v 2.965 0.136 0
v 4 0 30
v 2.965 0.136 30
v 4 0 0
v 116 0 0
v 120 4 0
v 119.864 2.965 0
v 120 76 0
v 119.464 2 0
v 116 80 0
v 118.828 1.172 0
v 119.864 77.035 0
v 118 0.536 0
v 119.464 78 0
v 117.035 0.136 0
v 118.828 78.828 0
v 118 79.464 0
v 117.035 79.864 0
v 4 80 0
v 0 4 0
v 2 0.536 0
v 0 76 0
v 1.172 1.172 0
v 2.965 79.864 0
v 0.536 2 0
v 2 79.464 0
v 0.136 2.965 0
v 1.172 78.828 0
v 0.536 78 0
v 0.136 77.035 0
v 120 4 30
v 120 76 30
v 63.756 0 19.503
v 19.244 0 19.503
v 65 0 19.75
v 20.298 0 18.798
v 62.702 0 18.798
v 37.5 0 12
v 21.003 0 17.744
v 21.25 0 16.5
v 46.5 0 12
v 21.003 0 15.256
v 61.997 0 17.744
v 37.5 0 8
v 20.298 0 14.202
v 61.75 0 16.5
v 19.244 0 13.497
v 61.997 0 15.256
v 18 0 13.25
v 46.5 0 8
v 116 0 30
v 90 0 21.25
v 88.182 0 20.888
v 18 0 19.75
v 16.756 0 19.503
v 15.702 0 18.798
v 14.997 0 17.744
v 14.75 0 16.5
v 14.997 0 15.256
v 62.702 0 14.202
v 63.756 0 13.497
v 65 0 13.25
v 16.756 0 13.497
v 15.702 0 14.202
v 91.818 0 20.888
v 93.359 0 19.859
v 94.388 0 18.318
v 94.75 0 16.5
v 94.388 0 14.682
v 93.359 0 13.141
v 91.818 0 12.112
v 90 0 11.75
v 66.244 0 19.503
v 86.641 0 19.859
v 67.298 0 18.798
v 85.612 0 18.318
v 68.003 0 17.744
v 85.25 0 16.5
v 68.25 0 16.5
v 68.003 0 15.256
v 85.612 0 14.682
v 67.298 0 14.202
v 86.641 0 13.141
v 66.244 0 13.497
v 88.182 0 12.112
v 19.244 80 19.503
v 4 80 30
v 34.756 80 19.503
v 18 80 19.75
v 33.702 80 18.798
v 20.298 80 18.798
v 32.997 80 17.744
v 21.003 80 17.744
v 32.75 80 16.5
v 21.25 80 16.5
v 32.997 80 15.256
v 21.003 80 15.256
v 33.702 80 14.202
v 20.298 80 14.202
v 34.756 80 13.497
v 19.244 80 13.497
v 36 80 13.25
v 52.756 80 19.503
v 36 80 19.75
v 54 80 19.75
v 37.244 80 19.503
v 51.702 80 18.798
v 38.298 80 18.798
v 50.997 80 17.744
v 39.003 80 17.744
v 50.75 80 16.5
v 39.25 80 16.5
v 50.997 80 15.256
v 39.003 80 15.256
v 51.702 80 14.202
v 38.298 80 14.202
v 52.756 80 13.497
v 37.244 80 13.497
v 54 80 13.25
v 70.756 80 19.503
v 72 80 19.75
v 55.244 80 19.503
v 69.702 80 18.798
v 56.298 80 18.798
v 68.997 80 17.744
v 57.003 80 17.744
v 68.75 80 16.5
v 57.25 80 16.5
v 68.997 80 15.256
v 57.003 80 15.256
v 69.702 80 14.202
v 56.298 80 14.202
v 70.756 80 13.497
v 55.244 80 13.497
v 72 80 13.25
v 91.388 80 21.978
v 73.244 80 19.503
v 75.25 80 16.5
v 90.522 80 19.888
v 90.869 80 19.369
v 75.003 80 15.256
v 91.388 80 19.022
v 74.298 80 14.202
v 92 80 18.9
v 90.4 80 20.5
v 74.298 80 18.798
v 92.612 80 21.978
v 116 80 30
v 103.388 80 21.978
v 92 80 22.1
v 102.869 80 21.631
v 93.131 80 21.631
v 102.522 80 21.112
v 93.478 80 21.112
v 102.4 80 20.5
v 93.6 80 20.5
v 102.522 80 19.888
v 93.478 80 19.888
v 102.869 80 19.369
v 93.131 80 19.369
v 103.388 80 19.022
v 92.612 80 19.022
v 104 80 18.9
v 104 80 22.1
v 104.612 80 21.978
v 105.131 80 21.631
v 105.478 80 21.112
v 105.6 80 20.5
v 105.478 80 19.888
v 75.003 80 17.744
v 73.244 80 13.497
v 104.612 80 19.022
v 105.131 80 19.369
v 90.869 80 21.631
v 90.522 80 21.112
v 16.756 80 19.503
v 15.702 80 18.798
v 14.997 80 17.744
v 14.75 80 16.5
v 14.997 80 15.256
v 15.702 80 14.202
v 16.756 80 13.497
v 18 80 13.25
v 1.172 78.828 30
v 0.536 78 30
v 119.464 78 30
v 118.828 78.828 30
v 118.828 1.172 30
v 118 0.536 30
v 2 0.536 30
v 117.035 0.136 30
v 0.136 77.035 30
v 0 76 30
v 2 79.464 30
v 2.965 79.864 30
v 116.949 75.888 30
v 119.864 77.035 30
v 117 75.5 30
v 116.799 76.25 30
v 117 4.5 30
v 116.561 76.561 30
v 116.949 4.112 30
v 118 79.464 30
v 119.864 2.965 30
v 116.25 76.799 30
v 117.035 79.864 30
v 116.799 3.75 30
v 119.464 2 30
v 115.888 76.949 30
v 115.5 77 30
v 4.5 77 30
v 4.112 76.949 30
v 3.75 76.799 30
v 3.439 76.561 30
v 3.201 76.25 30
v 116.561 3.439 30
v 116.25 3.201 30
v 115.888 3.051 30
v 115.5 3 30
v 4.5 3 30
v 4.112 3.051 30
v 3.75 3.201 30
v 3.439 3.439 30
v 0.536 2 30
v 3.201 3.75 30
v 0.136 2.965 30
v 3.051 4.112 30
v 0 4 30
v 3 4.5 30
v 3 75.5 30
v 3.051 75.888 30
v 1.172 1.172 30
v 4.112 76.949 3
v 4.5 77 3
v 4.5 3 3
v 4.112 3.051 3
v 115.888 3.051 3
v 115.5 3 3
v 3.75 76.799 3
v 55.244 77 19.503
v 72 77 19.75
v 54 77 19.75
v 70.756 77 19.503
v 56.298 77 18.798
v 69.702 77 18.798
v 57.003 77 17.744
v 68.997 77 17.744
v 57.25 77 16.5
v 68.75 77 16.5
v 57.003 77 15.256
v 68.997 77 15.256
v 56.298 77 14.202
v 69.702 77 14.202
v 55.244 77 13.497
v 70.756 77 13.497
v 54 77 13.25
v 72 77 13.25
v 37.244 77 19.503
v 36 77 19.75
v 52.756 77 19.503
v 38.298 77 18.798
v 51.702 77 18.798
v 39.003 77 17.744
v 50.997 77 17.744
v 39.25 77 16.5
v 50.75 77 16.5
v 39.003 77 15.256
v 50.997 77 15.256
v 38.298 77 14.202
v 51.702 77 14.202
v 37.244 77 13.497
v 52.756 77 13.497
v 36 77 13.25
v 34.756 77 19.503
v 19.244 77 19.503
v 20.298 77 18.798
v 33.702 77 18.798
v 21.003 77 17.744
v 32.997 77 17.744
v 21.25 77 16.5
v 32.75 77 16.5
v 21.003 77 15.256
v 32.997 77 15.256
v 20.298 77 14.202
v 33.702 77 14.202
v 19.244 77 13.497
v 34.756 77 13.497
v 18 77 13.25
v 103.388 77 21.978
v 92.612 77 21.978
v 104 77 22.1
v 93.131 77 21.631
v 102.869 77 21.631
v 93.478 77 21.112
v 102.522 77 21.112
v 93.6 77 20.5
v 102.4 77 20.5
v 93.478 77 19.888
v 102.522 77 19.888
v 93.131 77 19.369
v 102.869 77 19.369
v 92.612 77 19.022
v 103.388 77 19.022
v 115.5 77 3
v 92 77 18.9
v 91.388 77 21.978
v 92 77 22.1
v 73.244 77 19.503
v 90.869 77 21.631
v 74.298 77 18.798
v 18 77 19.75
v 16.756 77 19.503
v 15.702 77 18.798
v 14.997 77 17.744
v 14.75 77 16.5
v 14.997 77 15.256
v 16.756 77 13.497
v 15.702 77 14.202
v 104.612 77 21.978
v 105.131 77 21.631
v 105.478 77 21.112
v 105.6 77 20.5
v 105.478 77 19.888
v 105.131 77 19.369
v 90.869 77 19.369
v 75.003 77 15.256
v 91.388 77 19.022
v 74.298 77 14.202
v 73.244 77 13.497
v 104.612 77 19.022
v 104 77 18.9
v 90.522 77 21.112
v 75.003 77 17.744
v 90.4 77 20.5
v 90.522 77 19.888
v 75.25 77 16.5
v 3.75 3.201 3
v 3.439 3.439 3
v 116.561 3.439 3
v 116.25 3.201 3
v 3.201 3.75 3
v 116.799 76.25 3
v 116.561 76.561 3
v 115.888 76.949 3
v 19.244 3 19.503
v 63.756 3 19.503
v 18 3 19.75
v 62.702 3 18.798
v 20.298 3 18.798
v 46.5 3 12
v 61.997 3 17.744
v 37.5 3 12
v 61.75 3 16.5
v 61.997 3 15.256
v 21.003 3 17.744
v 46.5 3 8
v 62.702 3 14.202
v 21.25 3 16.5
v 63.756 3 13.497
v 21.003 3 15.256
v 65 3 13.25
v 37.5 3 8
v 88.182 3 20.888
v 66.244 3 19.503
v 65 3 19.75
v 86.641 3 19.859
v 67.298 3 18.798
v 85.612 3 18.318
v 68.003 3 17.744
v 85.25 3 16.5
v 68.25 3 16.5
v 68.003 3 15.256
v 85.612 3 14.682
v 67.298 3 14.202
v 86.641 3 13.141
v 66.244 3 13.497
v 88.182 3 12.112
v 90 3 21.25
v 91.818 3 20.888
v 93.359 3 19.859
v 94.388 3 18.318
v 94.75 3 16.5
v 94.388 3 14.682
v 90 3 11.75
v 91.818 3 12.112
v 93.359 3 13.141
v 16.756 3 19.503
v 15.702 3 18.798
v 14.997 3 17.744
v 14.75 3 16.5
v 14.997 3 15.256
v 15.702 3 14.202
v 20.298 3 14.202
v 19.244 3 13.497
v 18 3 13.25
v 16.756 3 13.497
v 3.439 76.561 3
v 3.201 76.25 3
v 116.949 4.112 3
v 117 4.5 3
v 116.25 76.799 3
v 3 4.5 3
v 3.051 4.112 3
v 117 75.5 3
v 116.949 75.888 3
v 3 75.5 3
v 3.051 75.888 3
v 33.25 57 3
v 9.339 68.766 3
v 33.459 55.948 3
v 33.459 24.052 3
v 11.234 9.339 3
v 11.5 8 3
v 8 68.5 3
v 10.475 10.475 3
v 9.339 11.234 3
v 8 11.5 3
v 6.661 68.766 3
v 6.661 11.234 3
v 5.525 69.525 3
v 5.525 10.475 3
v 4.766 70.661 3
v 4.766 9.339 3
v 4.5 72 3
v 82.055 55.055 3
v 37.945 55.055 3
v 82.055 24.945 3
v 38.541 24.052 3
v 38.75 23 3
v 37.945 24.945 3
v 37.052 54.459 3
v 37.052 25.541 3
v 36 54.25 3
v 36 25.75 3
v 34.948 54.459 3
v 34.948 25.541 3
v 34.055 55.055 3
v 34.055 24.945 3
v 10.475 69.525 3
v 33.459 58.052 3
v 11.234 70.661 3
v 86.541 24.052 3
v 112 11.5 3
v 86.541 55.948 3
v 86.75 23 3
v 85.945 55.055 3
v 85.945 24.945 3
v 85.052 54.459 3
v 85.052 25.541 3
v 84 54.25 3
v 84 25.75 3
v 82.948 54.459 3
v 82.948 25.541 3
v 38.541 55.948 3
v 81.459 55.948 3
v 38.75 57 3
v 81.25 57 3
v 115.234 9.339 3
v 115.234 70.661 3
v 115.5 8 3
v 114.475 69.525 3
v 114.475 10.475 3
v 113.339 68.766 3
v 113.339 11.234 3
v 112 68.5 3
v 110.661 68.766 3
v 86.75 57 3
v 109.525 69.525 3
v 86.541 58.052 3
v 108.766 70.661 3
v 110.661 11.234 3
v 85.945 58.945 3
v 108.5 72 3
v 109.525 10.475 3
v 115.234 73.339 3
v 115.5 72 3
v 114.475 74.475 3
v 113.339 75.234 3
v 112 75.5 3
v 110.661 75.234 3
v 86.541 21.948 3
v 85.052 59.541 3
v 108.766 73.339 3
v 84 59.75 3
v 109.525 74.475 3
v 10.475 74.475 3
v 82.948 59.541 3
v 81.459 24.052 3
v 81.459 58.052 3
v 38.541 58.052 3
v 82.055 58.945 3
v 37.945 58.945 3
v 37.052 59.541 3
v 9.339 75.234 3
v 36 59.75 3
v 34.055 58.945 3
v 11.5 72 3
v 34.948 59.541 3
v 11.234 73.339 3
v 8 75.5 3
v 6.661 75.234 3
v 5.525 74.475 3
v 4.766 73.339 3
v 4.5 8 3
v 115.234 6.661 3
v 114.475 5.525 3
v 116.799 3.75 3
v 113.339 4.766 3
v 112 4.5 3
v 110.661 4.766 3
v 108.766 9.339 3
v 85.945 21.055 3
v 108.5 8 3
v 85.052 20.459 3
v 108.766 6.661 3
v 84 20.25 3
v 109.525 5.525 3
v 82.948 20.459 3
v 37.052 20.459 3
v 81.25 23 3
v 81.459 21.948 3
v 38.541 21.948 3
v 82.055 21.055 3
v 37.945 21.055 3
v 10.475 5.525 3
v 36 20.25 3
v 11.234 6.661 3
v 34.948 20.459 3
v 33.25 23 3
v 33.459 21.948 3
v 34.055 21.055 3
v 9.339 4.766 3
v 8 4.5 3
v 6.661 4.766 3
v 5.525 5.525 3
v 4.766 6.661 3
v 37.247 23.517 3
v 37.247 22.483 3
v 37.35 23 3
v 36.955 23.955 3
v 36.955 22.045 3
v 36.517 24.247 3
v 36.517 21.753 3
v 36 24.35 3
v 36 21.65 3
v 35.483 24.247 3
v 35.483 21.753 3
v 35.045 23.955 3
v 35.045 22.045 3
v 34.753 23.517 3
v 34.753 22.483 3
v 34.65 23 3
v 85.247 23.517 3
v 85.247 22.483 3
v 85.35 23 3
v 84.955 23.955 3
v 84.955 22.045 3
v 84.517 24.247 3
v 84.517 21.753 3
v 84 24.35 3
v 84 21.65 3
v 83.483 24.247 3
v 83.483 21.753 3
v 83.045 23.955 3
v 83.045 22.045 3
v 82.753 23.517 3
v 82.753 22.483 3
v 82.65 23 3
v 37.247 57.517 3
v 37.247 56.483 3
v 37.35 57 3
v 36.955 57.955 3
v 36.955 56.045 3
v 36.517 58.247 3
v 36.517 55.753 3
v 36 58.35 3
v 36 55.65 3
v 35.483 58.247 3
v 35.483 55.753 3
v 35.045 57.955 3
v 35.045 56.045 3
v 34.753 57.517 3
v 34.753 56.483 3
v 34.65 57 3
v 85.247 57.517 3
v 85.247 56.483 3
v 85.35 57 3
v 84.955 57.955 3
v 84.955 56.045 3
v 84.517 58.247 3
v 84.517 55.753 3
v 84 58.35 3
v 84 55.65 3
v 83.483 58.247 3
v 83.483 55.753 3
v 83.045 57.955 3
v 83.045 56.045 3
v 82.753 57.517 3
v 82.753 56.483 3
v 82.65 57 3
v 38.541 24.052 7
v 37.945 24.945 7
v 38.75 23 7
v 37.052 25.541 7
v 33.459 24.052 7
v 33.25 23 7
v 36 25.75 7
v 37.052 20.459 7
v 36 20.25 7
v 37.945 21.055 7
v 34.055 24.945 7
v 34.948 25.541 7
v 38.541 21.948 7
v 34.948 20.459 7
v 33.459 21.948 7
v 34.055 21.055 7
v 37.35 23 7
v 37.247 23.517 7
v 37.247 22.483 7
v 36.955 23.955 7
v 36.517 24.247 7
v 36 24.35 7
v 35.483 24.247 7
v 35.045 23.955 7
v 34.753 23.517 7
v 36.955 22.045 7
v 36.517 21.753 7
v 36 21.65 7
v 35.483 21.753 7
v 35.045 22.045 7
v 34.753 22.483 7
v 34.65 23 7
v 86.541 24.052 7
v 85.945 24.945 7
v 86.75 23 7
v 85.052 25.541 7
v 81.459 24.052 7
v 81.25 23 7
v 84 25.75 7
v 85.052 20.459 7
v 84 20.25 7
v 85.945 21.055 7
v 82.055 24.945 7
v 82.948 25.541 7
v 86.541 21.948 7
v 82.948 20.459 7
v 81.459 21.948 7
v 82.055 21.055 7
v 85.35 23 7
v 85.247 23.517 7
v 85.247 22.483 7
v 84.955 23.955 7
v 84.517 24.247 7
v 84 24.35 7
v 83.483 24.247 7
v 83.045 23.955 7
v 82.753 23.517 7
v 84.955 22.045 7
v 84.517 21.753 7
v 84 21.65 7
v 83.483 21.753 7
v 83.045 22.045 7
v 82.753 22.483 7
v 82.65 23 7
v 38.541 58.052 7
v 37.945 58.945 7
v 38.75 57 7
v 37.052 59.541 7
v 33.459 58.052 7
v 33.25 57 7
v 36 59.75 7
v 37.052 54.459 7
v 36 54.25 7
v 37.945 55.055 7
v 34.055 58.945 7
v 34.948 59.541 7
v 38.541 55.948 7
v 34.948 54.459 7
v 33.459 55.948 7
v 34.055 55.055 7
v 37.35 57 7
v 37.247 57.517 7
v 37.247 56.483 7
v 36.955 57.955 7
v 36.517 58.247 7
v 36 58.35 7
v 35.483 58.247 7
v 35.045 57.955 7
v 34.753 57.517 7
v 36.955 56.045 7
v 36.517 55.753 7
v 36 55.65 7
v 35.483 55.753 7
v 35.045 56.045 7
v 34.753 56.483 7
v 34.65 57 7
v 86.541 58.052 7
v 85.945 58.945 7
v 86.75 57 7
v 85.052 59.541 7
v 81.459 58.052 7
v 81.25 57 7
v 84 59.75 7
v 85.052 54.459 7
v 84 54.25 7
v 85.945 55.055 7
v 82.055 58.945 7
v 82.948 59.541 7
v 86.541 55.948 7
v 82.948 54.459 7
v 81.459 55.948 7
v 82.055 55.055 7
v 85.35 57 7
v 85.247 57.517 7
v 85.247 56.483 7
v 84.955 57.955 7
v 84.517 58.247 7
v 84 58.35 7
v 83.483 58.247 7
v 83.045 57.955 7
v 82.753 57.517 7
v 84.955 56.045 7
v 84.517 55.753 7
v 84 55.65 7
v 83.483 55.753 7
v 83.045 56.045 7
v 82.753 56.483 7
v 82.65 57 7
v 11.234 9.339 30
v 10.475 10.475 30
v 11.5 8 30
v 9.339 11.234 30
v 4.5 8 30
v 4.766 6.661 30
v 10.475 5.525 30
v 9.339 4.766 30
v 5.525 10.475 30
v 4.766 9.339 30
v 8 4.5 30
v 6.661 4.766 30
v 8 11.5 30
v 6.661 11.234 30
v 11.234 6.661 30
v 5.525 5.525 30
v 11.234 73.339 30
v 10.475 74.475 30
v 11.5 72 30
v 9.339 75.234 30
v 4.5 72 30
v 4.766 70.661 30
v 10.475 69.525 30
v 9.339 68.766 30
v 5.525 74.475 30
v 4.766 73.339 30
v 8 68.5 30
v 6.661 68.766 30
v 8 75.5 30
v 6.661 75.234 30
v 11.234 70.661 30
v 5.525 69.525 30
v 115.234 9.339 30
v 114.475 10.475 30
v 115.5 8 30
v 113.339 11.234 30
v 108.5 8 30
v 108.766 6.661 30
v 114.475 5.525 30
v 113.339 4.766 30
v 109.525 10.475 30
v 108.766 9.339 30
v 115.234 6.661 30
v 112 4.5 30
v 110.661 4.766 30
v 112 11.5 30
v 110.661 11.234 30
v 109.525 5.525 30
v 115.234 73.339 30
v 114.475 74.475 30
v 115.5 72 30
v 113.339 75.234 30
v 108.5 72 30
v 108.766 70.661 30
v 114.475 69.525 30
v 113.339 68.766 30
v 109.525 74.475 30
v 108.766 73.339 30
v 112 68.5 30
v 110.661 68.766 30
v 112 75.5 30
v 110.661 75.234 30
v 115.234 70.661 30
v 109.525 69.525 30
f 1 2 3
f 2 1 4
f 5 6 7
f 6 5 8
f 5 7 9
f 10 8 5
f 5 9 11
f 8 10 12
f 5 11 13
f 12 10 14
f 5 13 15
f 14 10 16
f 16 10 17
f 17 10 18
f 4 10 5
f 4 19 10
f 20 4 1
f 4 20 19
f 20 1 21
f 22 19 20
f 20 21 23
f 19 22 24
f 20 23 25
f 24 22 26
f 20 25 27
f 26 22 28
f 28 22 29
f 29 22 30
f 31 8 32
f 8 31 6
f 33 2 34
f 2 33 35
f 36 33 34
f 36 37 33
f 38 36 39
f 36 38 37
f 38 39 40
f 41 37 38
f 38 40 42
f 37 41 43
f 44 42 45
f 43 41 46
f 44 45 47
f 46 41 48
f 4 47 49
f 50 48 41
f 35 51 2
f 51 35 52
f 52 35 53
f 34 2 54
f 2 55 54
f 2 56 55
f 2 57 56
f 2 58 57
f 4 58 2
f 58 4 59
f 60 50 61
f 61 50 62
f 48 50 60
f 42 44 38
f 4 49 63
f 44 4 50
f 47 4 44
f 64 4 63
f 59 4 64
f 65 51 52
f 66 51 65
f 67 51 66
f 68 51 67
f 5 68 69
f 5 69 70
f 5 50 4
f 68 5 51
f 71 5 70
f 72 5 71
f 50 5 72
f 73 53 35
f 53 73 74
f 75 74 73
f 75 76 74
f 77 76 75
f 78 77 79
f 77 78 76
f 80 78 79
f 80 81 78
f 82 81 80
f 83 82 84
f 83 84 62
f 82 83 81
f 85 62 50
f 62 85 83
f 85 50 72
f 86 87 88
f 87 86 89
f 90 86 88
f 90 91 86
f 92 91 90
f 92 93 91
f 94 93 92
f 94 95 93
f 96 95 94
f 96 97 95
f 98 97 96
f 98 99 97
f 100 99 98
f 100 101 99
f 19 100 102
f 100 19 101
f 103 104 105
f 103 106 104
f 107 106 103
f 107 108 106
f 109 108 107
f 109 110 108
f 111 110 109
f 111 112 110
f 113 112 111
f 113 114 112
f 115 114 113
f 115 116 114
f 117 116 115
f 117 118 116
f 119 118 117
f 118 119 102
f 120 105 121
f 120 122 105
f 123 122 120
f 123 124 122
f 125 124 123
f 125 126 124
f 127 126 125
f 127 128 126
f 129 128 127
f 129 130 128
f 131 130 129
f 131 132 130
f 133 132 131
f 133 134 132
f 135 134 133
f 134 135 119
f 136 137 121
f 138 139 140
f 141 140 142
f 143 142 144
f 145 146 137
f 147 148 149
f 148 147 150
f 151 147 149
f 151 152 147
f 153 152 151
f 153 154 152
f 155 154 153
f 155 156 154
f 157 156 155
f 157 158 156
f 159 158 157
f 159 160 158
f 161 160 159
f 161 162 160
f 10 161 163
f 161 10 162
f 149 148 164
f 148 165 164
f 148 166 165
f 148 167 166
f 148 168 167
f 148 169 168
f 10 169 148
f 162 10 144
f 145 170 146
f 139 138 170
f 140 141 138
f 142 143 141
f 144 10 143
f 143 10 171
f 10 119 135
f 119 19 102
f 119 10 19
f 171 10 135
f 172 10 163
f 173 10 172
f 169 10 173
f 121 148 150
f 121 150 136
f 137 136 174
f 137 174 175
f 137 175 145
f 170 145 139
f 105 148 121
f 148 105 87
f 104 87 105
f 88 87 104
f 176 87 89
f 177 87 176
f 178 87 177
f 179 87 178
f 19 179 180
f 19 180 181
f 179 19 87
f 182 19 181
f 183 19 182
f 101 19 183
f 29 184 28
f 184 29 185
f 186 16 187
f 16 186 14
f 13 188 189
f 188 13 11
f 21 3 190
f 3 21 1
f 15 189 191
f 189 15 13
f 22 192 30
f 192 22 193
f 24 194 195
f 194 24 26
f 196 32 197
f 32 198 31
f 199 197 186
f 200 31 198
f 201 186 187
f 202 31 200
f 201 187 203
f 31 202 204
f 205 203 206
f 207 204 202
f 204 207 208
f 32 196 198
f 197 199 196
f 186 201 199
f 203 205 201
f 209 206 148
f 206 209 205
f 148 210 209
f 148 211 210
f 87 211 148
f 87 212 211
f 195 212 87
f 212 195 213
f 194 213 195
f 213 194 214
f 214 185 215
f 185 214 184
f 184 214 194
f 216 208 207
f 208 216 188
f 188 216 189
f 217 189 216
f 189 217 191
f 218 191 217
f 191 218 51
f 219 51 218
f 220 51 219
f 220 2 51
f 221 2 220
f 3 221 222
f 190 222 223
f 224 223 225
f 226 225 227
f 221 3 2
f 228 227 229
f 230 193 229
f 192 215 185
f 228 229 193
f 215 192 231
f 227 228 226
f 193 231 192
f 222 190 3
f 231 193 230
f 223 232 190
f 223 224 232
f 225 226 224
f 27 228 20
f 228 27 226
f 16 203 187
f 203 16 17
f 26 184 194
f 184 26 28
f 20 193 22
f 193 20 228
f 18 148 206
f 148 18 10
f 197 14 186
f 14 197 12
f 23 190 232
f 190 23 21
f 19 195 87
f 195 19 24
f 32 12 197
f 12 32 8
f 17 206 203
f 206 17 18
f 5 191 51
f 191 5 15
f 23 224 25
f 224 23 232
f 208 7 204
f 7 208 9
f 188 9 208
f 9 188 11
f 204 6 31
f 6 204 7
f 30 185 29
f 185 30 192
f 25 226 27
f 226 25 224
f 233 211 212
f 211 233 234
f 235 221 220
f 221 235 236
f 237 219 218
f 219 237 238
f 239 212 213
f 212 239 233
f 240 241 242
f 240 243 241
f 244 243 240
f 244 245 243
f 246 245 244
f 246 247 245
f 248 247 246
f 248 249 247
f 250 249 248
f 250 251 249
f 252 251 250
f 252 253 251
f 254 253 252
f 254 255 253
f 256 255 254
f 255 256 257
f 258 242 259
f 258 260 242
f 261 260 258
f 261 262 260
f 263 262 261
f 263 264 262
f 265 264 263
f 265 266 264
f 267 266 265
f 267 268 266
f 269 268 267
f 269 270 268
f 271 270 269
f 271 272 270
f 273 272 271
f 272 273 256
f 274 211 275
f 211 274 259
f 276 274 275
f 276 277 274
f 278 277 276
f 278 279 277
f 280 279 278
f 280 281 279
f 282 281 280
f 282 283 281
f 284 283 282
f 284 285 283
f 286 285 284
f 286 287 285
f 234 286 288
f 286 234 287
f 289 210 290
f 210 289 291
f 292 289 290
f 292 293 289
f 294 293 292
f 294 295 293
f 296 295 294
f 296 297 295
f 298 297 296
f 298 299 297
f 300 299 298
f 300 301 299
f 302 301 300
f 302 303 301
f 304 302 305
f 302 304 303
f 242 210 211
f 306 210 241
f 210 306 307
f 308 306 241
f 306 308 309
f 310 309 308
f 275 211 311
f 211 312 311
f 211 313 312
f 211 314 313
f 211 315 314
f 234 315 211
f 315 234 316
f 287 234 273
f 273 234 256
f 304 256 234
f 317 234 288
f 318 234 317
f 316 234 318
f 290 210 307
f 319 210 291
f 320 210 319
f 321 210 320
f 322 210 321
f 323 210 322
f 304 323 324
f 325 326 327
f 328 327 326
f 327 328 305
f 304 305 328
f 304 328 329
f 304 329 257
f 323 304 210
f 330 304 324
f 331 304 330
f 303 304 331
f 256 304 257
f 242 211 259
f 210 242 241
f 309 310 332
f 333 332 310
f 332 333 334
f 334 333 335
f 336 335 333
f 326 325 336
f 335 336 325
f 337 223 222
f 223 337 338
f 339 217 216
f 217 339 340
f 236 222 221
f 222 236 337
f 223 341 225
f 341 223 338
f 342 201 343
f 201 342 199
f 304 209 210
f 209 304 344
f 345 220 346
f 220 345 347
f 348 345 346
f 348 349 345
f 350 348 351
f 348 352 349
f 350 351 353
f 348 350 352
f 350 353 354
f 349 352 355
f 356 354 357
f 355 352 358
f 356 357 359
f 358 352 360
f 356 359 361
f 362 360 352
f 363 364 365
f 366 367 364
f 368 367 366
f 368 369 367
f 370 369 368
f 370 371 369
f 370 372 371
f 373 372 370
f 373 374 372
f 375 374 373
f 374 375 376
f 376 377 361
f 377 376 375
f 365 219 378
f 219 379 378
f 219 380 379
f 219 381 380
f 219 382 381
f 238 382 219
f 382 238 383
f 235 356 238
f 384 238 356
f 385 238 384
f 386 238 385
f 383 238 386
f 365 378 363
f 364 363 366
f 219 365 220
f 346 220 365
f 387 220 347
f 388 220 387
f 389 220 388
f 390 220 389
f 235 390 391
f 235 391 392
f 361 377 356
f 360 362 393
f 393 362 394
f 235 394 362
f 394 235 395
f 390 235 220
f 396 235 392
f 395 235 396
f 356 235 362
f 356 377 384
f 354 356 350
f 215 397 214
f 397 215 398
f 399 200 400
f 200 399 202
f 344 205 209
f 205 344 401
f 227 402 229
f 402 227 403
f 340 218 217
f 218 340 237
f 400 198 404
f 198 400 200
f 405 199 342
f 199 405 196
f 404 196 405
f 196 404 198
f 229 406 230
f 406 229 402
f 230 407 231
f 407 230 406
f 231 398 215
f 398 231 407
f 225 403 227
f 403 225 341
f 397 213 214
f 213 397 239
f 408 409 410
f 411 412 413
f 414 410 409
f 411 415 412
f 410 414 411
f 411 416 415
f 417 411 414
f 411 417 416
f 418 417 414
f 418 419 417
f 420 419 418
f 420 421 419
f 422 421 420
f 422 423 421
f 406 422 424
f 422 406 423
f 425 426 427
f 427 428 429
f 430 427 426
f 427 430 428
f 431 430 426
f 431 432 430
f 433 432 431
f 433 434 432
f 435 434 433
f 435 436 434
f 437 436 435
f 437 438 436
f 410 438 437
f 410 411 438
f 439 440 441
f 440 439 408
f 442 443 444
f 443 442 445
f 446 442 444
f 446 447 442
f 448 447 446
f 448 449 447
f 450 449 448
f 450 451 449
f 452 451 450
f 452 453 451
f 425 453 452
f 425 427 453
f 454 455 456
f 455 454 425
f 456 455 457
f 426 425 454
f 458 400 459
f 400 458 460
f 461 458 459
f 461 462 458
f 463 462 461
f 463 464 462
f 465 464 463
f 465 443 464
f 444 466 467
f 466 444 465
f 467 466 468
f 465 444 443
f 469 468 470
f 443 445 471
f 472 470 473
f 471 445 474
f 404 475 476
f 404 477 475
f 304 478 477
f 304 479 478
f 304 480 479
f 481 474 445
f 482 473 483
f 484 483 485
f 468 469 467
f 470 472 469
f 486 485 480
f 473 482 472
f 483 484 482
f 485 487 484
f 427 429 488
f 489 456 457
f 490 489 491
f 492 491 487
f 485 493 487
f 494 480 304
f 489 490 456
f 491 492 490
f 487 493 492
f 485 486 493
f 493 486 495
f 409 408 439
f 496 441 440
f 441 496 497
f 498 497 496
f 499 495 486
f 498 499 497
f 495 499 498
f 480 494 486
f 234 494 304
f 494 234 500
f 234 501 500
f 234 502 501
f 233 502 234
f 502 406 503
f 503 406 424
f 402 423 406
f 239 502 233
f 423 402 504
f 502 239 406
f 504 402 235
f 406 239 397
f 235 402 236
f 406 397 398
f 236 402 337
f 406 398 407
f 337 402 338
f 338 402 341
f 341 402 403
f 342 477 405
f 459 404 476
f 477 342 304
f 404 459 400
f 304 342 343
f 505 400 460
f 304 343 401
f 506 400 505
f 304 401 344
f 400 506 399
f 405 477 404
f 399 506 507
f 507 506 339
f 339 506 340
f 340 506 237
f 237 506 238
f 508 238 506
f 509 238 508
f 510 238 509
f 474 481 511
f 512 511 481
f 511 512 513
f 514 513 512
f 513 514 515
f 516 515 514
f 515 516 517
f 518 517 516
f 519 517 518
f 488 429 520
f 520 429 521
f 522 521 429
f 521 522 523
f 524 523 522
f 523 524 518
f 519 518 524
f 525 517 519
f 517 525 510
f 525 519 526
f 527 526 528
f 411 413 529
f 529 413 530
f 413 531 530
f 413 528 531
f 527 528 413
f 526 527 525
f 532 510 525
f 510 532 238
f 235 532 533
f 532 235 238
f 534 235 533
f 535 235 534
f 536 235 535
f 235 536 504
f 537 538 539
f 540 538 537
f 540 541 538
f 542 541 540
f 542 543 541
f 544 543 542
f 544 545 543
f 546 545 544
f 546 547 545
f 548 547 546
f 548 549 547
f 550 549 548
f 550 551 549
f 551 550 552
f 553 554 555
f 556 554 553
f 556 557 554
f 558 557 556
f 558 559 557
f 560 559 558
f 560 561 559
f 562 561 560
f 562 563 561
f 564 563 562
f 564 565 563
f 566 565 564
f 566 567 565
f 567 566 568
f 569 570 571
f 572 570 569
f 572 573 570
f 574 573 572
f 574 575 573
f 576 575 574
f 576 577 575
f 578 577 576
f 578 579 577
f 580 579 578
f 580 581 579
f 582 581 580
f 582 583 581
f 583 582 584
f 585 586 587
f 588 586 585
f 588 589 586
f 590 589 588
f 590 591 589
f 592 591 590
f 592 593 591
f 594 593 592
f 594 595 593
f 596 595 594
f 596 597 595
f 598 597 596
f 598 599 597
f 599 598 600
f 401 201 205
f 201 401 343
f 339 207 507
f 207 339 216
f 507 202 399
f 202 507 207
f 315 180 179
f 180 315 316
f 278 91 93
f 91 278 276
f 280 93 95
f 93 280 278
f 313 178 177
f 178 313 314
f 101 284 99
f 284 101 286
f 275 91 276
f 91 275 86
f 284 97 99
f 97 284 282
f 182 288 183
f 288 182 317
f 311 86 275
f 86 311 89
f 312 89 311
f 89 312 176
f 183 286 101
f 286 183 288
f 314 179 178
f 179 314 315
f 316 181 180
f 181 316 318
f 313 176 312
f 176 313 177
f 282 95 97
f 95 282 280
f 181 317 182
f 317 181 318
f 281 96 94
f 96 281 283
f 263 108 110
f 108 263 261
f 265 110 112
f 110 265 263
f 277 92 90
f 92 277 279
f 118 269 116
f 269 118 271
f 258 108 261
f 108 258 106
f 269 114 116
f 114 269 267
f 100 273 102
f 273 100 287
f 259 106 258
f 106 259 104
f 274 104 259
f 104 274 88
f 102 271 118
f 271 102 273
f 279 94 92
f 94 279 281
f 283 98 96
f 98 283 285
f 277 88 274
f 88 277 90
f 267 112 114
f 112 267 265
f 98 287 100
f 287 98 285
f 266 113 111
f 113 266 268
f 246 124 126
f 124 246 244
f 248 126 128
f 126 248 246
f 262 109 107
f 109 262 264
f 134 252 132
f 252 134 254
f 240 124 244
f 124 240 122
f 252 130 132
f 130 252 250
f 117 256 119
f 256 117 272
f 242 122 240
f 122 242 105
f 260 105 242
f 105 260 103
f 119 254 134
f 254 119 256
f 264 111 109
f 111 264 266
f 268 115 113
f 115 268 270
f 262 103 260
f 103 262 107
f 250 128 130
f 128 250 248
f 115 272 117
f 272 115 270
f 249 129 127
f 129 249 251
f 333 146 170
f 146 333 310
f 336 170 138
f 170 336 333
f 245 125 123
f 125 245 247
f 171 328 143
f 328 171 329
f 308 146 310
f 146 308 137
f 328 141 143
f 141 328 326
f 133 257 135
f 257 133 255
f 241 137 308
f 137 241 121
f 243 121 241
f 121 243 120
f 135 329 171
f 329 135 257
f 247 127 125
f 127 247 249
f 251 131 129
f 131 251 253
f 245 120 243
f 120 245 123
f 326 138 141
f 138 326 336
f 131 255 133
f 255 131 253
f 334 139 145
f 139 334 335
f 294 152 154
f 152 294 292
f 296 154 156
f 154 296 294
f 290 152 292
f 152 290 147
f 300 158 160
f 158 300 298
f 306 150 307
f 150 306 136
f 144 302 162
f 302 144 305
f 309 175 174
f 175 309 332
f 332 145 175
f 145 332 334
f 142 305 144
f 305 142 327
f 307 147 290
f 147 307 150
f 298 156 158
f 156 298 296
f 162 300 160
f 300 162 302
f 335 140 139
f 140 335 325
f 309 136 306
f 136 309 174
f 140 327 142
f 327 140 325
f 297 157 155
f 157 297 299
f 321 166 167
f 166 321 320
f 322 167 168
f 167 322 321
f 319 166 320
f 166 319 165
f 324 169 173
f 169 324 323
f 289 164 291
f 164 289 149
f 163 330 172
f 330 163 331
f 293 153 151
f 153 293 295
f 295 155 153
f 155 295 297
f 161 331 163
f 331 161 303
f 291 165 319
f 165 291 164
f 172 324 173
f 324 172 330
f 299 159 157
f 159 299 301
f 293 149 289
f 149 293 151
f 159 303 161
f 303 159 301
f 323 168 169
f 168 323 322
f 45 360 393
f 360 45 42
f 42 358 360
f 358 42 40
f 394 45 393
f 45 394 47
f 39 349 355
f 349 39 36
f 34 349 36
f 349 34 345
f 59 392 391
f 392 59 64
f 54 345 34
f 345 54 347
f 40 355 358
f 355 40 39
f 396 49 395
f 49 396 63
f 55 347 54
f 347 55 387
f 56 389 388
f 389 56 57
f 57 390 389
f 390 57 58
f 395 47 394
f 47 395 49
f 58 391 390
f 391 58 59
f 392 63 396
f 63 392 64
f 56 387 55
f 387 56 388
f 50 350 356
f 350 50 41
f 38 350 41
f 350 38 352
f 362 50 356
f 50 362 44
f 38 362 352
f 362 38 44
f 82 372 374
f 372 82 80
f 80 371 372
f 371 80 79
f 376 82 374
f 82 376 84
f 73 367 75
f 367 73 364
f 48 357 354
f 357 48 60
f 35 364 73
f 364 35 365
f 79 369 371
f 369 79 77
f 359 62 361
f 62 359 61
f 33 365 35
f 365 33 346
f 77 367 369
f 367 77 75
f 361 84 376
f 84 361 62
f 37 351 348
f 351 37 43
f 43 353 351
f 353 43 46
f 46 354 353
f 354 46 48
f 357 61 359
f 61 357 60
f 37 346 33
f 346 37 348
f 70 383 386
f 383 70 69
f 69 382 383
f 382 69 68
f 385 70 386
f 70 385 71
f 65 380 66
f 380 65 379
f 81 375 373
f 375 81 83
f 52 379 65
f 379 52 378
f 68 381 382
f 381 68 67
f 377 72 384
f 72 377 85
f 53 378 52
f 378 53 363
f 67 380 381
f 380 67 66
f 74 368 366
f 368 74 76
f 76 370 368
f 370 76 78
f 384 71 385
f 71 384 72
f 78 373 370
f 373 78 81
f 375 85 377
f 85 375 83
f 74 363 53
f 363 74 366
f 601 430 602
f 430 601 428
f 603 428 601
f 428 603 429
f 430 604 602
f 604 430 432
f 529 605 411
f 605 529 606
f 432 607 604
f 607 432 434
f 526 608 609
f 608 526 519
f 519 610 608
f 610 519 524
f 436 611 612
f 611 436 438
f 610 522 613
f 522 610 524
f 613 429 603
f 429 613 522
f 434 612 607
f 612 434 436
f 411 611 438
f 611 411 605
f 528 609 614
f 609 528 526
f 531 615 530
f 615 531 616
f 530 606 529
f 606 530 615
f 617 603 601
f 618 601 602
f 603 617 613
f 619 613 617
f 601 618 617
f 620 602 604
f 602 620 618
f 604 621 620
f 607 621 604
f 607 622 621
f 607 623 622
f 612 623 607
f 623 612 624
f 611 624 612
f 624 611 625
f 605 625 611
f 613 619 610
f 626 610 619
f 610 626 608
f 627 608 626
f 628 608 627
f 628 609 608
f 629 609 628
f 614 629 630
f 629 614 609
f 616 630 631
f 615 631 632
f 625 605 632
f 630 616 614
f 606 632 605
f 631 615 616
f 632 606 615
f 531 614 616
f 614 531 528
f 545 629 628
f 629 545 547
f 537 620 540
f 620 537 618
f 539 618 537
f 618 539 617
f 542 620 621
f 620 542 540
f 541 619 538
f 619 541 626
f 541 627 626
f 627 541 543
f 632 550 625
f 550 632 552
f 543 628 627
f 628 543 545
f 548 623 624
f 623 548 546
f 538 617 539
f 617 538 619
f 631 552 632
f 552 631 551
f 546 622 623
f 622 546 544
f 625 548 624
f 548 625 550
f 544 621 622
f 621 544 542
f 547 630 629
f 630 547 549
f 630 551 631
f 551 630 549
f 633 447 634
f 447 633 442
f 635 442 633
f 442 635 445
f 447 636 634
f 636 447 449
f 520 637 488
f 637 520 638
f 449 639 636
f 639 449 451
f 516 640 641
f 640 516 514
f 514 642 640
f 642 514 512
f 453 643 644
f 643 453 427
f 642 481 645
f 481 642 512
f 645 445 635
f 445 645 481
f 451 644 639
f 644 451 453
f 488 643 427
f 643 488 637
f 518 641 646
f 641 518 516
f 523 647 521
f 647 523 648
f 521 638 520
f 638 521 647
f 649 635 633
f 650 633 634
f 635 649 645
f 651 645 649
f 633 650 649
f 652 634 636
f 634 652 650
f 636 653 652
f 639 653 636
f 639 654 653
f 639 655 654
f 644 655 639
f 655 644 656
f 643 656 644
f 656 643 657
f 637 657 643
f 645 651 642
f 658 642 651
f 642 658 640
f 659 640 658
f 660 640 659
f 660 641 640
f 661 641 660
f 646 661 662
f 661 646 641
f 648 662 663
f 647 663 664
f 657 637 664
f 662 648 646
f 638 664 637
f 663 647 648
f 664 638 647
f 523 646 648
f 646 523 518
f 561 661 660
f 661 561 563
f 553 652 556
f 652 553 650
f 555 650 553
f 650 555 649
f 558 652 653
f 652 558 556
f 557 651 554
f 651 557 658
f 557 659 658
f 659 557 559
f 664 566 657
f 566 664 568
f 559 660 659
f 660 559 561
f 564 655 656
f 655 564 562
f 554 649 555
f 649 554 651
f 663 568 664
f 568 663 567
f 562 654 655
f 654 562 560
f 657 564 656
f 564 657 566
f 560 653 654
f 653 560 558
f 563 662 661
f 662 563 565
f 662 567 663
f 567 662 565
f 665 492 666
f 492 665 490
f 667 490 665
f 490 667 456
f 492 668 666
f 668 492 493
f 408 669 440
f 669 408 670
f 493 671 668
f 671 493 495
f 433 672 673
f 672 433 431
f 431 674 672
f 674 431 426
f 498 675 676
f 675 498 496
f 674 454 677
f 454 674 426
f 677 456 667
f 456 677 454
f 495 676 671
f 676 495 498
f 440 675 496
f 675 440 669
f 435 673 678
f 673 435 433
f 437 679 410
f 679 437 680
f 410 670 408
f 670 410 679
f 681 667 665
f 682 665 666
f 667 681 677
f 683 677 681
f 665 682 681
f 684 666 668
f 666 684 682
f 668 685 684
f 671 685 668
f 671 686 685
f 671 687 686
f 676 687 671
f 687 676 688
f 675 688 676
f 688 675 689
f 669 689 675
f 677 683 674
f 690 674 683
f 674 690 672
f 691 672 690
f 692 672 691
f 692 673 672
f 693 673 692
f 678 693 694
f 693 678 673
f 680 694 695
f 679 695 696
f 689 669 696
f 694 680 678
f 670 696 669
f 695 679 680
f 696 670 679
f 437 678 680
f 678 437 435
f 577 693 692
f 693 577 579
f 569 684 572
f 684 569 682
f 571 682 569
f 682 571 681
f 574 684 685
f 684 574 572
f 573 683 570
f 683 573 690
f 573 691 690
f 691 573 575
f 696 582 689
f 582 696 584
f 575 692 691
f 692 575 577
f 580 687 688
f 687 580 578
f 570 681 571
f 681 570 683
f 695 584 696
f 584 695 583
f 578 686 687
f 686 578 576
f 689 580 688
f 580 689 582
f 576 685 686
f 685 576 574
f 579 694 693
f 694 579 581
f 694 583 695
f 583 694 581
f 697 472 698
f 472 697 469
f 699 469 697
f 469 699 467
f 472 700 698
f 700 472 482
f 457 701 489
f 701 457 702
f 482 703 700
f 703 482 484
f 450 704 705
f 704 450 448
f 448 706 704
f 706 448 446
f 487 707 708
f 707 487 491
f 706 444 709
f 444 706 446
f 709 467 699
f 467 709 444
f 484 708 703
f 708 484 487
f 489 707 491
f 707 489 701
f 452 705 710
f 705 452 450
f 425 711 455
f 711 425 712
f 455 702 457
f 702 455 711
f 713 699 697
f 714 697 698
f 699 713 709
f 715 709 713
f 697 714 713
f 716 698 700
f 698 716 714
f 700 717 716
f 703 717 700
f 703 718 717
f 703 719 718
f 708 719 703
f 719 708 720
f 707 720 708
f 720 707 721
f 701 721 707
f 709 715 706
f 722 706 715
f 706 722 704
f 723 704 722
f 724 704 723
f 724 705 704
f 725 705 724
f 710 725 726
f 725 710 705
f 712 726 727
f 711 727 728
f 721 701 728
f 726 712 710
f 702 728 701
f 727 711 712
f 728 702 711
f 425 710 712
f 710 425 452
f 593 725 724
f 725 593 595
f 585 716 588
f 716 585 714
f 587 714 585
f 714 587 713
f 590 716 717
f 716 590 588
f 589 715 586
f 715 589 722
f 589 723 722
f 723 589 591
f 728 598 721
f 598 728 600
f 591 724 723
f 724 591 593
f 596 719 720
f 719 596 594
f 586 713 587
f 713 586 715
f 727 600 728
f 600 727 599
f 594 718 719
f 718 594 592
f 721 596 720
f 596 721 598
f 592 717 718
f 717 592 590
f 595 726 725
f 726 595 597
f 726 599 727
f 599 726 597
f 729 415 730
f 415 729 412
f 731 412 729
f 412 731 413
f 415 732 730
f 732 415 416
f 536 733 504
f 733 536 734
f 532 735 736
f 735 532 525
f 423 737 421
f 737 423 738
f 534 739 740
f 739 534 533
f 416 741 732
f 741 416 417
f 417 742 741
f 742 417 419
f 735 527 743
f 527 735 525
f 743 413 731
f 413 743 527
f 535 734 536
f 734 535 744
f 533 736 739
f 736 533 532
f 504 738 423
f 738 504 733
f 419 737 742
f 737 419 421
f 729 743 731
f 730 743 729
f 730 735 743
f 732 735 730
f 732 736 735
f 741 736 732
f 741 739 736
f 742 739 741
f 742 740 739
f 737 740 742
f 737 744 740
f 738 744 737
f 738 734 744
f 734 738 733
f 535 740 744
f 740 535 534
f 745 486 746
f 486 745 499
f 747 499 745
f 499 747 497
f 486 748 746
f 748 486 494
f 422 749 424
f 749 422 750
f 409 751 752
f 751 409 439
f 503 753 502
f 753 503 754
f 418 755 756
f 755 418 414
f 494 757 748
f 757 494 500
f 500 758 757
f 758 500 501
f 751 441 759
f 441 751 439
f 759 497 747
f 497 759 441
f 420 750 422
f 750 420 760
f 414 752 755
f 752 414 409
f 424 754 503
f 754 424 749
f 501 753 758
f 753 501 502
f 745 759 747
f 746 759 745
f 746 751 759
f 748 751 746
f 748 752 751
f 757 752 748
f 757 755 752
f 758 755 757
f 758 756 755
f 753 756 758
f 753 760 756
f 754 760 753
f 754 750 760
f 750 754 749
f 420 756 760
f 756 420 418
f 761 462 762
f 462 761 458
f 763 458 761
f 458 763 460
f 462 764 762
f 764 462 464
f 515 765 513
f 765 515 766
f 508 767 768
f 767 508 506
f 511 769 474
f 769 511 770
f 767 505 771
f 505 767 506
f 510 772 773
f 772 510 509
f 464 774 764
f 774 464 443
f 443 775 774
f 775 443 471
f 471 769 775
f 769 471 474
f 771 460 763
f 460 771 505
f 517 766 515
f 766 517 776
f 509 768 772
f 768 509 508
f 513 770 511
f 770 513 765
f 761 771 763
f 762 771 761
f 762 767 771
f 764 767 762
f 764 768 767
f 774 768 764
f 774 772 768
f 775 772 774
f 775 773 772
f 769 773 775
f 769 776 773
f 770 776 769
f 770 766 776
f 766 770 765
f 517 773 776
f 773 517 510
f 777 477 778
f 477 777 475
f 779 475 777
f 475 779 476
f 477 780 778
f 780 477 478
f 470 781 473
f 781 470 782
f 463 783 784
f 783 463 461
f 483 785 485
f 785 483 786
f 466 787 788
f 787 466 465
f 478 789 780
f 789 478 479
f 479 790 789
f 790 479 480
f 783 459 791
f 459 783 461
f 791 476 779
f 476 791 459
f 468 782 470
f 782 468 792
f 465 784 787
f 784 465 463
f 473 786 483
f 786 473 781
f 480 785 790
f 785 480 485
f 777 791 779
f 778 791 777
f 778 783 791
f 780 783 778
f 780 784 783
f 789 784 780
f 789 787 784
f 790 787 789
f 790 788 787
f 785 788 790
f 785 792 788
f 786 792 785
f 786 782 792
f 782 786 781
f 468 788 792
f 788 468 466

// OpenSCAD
/**
 * gpsdo_enclosure.scad — TM-CAL-ENC-001 Rev A
 * GPS-Disciplined Oscillator Enclosure
 *
 * Contents:
 *   - ESP32-WROOM-32 devboard (38mm × 52mm)
 *   - Si5351A module or PCB (25mm × 15mm)
 *   - u-blox NEO-M8N module (16mm × 12mm)
 *   - Small perfboard/PCB for AD8307, buffers
 *
 * Front panel: 3× SMA (10M REF, 1M REF, PROG OUT), 1× SMA (CAL LVL), LEDs
 * Rear panel:  SMA (GPS ANT), USB Micro-B, barrel jack 5V, BNC (FREQ IN)
 *
 * Envelope: 120×80×40 mm (well within 200×200×200 print bed)
 */

// ── Parameters ─────────────────────────────────────────────────────────────
box_w  = 120.0;
box_d  = 80.0;
box_h  = 40.0;
wall   = 3.0;
floor_h = 3.0;
lid_h  = 10.0;
body_h = box_h - lid_h;
r      = 4.0;
$fn    = 32;

// SMA panel mount hole
sma_d  = 6.5;   // SMA(F) panel mount threaded barrel
led_d  = 3.2;   // 3mm LED bezel
usb_w  = 9.0;   // USB Micro-B footprint width
usb_h  = 4.0;   // USB Micro-B footprint height
barrel_d = 6.5; // 5V barrel jack
bnc_d  = 9.5;   // BNC panel mount hole

// PCB standoffs (matches ESP32 devboard + aux PCB)
so_h   = 4.0;   // standoff height
so_od  = 5.5;
so_id  = 2.7;   // M3 clearance
screw_d = 3.3;  // M3 lid screw

module rounded_box(w, d, h, r_) {
    hull()
        for (x=[r_, w-r_]) for (y=[r_, d-r_])
            translate([x, y, 0]) cylinder(h=h, r=r_, $fn=24);
}

module standoff(x, y) {
    translate([x, y, floor_h])
        difference() {
            cylinder(h=so_h, d=so_od, $fn=16);
            translate([0, 0, -0.5]) cylinder(h=so_h+1, d=so_id, $fn=16);
        }
}

module body() {
    difference() {
        rounded_box(box_w, box_d, body_h, r);

        // Inner cavity
        translate([wall, wall, floor_h])
            rounded_box(box_w-2*wall, box_d-2*wall, body_h, r-wall+0.5);

        // ── FRONT PANEL (y=box_d): SMA outputs + LEDs ──────────────────
        // SMA: 10M REF
        translate([18, box_d+0.5, floor_h + (body_h-floor_h)/2])
        rotate([90,0,0]) cylinder(h=wall+1, d=sma_d, $fn=16);
        // SMA: 1M REF
        translate([36, box_d+0.5, floor_h + (body_h-floor_h)/2])
        rotate([90,0,0]) cylinder(h=wall+1, d=sma_d, $fn=16);
        // SMA: PROG OUT
        translate([54, box_d+0.5, floor_h + (body_h-floor_h)/2])
        rotate([90,0,0]) cylinder(h=wall+1, d=sma_d, $fn=16);
        // SMA: CAL LVL (PROG through 20dB pad)
        translate([72, box_d+0.5, floor_h + (body_h-floor_h)/2])
        rotate([90,0,0]) cylinder(h=wall+1, d=sma_d, $fn=16);
        // LED: GPS (green)
        translate([92, box_d+0.5, floor_h + (body_h-floor_h)/2 + 4])
        rotate([90,0,0]) cylinder(h=wall+1, d=led_d, $fn=16);
        // LED: LOCK (blue)
        translate([104, box_d+0.5, floor_h + (body_h-floor_h)/2 + 4])
        rotate([90,0,0]) cylinder(h=wall+1, d=led_d, $fn=16);

        // ── REAR PANEL (y=0): GPS ANT, USB, power, FREQ IN ─────────────
        // SMA: GPS ANTENNA
        translate([18, -0.5, floor_h + (body_h-floor_h)/2])
        rotate([-90,0,0]) cylinder(h=wall+1, d=sma_d, $fn=16);
        // USB Micro-B (ESP32 programming + power)
        translate([42 - usb_w/2, -0.5, floor_h + 5])
            cube([usb_w, wall+1, usb_h]);
        // Barrel jack 5V
        translate([65, -0.5, floor_h + (body_h-floor_h)/2])
        rotate([-90,0,0]) cylinder(h=wall+1, d=barrel_d, $fn=16);
        // BNC: FREQ IN (counter)
        translate([90, -0.5, floor_h + (body_h-floor_h)/2])
        rotate([-90,0,0]) cylinder(h=wall+1, d=bnc_d, $fn=16);

        // ── Lid screw holes (M3) ───────────────────────────────────────
        for (x=[8, box_w-8]) for (y=[8, box_d-8])
            translate([x, y, body_h-5])
                cylinder(h=6, d=screw_d, $fn=16);
    }

    // PCB standoffs — ESP32 devboard footprint approx 38×52mm
    // Offset to center in box
    ex = (box_w - 52) / 2;
    ey = (box_d - 38) / 2;
    standoff(ex + 2,       ey + 2);
    standoff(ex + 52 - 2,  ey + 2);
    standoff(ex + 2,       ey + 38 - 2);
    standoff(ex + 52 - 2,  ey + 38 - 2);

    // Corner screw bosses
    for (x=[8, box_w-8]) for (y=[8, box_d-8])
        translate([x, y, 0]) cylinder(h=body_h, d=7, $fn=16);
}

module lid() {
    fl_d    = 3.5;
    plate_h = lid_h - fl_d;
    difference() {
        union() {
            rounded_box(box_w, box_d, plate_h, r);
            translate([wall+1, wall+1, plate_h])
                rounded_box(box_w-2*(wall+1), box_d-2*(wall+1), fl_d, r-wall);
        }
        for (x=[8, box_w-8]) for (y=[8, box_d-8])
            translate([x, y, -0.5])
                cylinder(h=lid_h+1, d=screw_d, $fn=16);
        // Label recess on top
        translate([(box_w-60)/2, (box_d-12)/2, -0.5])
            cube([60, 12, 1.0]);
    }
    // Raised label text
    translate([(box_w-54)/2, (box_d-8)/2, plate_h-0.8])
        linear_extrude(1.0)
            text("GPSDO CAL REF", size=4.5, font="Liberation Sans:style=Bold");
}

// ── Render ─────────────────────────────────────────────────────────────────
print_part = "body";   // "body" | "lid"

if (print_part == "body")
    color("darkslategray", 0.9) body();
else
    color("slategray", 0.9) lid();

// ── Panel Labels (for reference — print separate decal or engrave) ──────────
// FRONT (y=box_d face):  10M | 1M | PROG | CAL-LVL | GPS | LOCK
// REAR  (y=0 face):      GPS-ANT | USB | 5V-IN | FREQ-IN
